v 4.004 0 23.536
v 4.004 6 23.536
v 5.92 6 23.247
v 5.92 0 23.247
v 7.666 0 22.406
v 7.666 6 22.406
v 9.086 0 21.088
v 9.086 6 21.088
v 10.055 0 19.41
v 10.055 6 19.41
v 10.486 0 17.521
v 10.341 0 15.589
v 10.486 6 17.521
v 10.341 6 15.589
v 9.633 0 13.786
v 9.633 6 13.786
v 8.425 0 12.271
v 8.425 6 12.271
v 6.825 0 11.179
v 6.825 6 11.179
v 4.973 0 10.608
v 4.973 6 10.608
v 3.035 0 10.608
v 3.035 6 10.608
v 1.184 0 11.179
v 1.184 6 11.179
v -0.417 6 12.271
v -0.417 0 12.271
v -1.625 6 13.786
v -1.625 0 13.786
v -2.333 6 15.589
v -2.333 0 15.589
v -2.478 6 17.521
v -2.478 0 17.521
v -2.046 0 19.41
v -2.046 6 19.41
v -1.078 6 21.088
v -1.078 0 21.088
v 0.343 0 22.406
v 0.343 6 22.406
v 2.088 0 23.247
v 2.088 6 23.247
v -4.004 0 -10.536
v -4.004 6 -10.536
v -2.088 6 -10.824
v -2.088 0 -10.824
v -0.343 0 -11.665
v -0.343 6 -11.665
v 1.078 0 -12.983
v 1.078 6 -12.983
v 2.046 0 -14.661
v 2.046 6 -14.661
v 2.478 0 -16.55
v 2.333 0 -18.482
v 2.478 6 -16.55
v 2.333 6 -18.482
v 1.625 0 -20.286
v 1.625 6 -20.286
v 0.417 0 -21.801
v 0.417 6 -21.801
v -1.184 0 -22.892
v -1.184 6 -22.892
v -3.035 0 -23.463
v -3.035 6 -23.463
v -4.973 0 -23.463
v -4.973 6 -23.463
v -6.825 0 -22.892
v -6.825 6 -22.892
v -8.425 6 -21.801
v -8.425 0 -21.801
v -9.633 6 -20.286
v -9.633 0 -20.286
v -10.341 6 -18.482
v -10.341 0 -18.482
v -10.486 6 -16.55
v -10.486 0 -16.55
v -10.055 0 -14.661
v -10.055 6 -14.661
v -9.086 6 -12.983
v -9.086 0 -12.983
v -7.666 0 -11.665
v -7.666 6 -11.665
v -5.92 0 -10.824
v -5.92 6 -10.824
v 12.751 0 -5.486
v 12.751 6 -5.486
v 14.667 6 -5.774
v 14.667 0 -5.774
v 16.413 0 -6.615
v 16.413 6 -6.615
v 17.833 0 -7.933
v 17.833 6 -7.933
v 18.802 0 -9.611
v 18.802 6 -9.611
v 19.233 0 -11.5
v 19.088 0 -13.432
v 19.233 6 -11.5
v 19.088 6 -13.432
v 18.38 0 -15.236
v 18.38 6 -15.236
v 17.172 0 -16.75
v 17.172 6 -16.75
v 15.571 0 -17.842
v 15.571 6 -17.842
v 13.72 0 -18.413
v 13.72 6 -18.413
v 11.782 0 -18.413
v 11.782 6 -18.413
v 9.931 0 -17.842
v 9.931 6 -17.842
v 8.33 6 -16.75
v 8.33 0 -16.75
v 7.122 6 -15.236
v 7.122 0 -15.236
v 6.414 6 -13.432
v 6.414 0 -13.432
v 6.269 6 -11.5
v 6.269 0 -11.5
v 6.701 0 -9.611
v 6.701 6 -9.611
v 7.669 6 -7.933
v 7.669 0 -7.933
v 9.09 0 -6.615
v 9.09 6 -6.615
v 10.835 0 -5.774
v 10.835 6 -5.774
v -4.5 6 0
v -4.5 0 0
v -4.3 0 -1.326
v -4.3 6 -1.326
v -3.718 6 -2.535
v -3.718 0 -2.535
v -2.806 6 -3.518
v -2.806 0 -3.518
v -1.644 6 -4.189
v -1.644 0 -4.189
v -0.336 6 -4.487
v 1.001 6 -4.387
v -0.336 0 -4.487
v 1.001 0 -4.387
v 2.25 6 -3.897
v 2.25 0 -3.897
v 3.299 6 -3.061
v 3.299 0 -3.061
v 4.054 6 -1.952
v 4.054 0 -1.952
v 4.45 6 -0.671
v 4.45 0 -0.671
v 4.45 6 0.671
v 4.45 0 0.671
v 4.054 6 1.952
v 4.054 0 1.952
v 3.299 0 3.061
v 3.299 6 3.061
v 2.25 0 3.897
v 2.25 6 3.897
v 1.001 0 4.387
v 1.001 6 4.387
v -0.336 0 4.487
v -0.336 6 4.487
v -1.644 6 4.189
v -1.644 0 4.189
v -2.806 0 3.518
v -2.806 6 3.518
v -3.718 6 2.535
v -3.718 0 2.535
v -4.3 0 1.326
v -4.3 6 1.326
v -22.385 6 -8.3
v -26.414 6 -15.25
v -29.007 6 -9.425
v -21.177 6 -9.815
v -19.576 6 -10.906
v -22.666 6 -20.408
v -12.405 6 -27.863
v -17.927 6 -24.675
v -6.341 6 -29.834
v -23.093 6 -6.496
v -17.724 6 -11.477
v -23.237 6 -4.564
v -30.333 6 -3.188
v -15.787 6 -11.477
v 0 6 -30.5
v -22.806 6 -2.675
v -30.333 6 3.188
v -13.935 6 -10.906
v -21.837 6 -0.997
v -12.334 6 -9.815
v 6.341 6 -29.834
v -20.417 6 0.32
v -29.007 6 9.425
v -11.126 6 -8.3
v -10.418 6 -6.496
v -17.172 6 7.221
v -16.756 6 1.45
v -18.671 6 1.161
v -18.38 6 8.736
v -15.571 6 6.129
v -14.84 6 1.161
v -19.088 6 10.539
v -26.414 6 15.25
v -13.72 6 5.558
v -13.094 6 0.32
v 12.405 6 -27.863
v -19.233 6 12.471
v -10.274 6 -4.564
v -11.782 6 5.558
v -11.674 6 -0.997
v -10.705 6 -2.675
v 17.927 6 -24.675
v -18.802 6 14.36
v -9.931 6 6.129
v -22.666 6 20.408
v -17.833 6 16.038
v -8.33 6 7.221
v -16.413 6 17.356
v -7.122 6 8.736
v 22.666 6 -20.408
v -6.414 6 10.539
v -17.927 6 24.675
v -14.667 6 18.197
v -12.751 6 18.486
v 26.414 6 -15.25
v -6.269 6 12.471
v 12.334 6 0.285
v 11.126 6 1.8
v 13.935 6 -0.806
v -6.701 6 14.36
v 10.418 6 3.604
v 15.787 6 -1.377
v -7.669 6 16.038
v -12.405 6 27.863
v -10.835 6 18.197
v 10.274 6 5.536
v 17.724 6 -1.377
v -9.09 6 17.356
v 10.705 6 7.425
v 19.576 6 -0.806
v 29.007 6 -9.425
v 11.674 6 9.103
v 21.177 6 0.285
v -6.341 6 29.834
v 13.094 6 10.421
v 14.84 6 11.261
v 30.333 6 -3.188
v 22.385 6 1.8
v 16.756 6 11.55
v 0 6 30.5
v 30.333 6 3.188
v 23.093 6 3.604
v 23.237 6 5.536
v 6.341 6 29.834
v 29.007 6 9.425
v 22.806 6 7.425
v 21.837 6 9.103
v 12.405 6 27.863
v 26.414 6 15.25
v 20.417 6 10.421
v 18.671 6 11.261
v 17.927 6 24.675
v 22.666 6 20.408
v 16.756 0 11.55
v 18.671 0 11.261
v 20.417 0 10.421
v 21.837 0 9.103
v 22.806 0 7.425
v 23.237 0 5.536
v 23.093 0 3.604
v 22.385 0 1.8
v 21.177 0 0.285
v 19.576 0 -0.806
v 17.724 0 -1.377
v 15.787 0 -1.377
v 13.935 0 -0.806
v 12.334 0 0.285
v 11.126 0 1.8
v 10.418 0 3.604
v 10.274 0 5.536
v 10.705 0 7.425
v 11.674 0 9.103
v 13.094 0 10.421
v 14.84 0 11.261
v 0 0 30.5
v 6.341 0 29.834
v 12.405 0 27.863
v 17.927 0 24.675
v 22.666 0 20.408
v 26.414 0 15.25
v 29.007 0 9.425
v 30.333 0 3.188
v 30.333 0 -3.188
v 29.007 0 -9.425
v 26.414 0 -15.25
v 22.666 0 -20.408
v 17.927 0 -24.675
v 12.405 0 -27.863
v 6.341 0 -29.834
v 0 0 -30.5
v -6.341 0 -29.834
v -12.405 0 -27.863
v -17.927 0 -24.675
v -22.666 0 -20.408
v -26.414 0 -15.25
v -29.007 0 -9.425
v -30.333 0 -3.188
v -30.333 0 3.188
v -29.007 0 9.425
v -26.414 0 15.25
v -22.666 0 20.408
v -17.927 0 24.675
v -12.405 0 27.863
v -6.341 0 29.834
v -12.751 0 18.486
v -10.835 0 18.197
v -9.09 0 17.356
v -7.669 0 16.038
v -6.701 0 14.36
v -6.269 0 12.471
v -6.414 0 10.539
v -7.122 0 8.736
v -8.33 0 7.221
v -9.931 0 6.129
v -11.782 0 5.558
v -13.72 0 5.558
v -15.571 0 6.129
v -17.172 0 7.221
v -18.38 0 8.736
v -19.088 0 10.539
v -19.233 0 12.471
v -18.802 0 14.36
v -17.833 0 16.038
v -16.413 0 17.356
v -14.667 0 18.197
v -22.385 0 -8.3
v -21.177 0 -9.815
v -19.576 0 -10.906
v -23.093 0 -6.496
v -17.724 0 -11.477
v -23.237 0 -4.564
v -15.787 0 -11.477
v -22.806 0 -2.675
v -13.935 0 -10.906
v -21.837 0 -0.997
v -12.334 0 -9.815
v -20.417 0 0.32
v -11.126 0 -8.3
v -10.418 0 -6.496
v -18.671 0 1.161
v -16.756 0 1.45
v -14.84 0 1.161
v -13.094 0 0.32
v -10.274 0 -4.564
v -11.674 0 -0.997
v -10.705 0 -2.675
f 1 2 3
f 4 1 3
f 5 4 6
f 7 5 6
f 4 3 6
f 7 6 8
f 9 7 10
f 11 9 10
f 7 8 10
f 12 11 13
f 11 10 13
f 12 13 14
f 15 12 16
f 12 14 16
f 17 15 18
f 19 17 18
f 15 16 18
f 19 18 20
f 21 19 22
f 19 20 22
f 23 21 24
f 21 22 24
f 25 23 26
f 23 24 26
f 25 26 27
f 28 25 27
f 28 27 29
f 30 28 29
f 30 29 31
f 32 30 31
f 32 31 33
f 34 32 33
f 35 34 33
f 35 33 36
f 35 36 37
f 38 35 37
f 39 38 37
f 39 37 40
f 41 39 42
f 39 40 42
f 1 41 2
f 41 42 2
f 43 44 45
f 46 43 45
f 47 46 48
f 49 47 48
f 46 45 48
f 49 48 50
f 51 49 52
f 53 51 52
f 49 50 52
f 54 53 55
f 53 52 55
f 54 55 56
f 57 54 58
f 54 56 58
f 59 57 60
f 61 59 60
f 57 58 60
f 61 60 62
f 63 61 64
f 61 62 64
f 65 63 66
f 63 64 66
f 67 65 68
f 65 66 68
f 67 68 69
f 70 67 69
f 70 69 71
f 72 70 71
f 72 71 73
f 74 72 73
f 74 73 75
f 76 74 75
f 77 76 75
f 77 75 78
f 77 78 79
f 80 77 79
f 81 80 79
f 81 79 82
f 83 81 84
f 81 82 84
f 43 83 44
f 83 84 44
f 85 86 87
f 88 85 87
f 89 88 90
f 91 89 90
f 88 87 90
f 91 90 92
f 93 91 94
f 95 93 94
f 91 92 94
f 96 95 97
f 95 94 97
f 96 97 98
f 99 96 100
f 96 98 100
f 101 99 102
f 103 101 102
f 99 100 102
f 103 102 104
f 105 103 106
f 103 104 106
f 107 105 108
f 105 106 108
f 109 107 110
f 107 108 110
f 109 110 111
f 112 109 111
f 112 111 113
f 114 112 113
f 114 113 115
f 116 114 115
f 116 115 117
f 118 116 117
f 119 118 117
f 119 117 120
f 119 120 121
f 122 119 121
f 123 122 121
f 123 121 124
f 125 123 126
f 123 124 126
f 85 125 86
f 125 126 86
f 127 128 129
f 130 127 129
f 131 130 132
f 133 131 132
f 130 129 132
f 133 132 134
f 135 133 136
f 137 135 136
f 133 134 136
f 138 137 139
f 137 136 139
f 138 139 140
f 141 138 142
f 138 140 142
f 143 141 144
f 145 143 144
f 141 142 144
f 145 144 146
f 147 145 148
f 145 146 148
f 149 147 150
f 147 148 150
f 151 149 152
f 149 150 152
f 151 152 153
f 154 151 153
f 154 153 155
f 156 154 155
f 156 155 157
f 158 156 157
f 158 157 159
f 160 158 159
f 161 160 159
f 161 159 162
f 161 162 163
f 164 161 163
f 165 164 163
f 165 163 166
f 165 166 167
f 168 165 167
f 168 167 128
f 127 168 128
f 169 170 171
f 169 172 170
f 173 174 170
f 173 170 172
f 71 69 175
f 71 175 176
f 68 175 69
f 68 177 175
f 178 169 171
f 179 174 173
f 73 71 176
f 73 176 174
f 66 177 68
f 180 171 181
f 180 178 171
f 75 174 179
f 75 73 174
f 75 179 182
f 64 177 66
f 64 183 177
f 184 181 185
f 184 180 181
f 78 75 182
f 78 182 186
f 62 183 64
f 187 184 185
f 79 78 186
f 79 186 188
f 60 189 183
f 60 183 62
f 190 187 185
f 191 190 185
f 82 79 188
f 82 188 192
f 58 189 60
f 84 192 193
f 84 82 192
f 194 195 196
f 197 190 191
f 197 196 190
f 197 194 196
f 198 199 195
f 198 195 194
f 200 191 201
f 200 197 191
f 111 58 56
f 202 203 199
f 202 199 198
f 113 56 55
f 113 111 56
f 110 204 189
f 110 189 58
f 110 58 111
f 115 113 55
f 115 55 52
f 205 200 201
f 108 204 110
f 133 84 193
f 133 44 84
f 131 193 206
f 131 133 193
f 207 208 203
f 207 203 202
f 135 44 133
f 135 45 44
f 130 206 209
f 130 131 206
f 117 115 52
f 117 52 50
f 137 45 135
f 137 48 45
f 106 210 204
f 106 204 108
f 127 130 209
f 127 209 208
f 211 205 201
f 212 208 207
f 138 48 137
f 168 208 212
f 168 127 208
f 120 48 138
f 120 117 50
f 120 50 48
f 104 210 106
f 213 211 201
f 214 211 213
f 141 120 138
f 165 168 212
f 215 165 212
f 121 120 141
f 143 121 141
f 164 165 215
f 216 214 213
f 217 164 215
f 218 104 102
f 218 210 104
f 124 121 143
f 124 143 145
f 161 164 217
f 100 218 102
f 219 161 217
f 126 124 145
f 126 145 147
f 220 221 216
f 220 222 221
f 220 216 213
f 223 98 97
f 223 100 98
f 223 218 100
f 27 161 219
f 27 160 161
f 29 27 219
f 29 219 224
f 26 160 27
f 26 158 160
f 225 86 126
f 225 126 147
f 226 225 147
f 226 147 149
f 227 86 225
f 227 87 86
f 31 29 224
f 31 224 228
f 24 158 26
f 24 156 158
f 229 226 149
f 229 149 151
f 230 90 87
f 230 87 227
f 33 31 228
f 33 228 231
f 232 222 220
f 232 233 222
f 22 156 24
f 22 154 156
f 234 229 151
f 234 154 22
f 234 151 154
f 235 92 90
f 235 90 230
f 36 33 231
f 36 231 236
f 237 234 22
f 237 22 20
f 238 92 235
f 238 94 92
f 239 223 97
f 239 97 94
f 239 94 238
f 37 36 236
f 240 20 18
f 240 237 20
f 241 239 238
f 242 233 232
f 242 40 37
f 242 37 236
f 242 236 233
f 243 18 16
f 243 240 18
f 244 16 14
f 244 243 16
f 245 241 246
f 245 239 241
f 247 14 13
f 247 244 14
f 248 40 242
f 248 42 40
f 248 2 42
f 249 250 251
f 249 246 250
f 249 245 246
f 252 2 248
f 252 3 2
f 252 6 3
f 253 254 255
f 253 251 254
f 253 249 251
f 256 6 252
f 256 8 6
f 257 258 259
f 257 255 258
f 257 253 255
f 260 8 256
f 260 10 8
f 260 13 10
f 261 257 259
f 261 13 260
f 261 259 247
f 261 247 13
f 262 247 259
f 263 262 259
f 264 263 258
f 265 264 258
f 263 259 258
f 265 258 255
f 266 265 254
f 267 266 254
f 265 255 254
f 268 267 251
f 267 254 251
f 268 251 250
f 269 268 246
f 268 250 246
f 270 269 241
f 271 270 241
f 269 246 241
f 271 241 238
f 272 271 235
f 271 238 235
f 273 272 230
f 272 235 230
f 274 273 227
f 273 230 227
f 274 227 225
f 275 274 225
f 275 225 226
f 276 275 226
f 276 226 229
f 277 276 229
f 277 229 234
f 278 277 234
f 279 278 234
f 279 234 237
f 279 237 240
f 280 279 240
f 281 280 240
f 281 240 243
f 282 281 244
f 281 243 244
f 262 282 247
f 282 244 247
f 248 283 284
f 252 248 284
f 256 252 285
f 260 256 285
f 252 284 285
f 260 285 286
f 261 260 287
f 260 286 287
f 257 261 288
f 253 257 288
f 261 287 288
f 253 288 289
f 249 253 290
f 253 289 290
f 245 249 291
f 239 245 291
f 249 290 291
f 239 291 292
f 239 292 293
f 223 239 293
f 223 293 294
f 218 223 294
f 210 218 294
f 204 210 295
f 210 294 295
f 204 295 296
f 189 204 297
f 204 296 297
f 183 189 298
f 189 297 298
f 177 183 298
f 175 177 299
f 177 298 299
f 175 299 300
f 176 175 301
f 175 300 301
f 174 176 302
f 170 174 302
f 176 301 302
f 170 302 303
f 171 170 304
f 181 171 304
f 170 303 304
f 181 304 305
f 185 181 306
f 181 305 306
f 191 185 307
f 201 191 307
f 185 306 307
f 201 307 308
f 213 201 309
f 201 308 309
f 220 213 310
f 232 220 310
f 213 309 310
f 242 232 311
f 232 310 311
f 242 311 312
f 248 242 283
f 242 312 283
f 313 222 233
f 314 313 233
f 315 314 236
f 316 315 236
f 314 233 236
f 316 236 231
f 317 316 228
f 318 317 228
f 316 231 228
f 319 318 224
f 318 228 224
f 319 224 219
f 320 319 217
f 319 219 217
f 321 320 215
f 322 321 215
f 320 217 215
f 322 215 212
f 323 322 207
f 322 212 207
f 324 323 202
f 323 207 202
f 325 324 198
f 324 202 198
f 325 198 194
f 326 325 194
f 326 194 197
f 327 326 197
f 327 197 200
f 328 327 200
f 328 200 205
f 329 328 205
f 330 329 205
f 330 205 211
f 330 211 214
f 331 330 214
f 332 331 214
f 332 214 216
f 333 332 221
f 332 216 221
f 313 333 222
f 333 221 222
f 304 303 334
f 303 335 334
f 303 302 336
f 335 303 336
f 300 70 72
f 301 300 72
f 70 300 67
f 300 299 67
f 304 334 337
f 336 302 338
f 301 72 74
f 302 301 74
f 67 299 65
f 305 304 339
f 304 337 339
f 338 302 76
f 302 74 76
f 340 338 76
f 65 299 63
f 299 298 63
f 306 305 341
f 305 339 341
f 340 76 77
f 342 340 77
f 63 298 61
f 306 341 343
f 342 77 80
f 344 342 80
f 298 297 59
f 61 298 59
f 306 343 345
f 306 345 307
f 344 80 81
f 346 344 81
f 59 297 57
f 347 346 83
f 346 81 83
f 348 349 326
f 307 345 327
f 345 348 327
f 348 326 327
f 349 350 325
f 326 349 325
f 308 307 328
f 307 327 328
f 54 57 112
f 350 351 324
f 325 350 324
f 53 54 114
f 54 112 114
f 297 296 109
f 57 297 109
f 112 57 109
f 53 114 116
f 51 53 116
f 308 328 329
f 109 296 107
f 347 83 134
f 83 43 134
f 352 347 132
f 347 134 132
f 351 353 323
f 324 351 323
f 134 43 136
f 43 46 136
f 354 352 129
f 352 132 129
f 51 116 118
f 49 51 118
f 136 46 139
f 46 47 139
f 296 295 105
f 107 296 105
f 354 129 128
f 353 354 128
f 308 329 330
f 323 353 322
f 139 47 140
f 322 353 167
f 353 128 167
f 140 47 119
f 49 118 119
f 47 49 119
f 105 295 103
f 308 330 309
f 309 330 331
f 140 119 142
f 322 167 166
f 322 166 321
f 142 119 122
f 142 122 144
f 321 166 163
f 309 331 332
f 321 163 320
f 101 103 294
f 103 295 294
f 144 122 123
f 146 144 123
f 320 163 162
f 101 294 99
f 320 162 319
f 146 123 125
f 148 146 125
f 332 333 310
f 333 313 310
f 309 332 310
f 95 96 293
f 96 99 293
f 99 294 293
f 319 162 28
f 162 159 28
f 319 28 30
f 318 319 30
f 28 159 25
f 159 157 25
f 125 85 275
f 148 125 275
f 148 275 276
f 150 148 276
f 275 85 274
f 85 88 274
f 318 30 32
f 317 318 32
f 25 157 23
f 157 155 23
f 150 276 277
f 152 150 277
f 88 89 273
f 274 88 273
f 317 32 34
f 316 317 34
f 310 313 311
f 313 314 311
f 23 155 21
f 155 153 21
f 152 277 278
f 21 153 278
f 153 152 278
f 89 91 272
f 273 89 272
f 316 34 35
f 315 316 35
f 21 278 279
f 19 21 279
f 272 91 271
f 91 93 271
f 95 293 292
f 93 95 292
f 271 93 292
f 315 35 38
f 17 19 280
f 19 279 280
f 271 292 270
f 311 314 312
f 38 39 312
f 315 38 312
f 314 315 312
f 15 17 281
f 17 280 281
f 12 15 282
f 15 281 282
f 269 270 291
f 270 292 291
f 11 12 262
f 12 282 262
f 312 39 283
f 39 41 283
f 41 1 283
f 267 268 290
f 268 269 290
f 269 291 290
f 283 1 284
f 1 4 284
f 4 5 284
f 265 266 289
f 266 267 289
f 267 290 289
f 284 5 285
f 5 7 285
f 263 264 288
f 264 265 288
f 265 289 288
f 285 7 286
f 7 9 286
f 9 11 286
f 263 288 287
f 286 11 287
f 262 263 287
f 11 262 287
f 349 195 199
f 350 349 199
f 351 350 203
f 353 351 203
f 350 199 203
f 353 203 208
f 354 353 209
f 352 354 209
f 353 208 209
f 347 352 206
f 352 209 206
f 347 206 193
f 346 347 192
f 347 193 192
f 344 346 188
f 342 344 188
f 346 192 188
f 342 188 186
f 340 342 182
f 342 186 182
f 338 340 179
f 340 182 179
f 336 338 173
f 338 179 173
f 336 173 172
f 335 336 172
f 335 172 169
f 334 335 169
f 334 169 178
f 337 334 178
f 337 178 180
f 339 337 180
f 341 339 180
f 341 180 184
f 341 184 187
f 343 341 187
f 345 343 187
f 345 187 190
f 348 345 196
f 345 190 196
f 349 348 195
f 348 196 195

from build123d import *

# Parameters (mm, degrees)
SZKIC2_R                    = 30.5
DODANIE_WYCI_GNI_CIE2_DEPTH = 6
OTW_R_9_0_9_1_D             = 9
SZKIC8_R                    = 6.5
WYTNIJ_WYCI_GNI_CIE2_DEPTH  = 6


with BuildPart() as part:
    # Szkic2 → Dodanie-wyciągnięcie2 (new body)
    with BuildSketch(Plane(origin=(0, 0, 0), x_dir=(1, 0, 0), z_dir=(0, 1, 0))):
        with Locations(Location((0, 0, 0), (0, 0, 270))):
            Circle(SZKIC2_R)
    extrude(amount=DODANIE_WYCI_GNI_CIE2_DEPTH)

    # Otwór Ø9.0 (9)1 (through all)
    with Locations(Plane(origin=(0, 6, 0), x_dir=(1, 0, 0), z_dir=(0, 1, 0))):
        with Locations((0, 0)):
            Hole(OTW_R_9_0_9_1_D / 2)

    # Szkic8 → Wytnij-wyciągnięcie2 (cut)
    with BuildSketch(Plane(origin=(0, 6, 0), x_dir=(1, 0, 0), z_dir=(0, 1, 0))):
        with Locations(Location((-12.751231108, -11.985662487, 0), (0, 0, 270))):
            Circle(SZKIC8_R)
        with Locations(Location((-16.755503748, 5.050058825, 0), (0, 0, 270))):
            Circle(SZKIC8_R)
        with Locations(Location((-4.004272641, 17.035721312, 0), (0, 0, 270))):
            Circle(SZKIC8_R)
        with Locations(Location((12.751231108, 11.985662487, 0), (0, 0, 270))):
            Circle(SZKIC8_R)
        with Locations(Location((16.755503748, -5.050058825, 0), (0, 0, 270))):
            Circle(SZKIC8_R)
        with Locations(Location((4.004272641, -17.035721312, 0), (0, 0, 270))):
            Circle(SZKIC8_R)
    extrude(amount=-WYTNIJ_WYCI_GNI_CIE2_DEPTH, mode=Mode.SUBTRACT)


solid = part.part
